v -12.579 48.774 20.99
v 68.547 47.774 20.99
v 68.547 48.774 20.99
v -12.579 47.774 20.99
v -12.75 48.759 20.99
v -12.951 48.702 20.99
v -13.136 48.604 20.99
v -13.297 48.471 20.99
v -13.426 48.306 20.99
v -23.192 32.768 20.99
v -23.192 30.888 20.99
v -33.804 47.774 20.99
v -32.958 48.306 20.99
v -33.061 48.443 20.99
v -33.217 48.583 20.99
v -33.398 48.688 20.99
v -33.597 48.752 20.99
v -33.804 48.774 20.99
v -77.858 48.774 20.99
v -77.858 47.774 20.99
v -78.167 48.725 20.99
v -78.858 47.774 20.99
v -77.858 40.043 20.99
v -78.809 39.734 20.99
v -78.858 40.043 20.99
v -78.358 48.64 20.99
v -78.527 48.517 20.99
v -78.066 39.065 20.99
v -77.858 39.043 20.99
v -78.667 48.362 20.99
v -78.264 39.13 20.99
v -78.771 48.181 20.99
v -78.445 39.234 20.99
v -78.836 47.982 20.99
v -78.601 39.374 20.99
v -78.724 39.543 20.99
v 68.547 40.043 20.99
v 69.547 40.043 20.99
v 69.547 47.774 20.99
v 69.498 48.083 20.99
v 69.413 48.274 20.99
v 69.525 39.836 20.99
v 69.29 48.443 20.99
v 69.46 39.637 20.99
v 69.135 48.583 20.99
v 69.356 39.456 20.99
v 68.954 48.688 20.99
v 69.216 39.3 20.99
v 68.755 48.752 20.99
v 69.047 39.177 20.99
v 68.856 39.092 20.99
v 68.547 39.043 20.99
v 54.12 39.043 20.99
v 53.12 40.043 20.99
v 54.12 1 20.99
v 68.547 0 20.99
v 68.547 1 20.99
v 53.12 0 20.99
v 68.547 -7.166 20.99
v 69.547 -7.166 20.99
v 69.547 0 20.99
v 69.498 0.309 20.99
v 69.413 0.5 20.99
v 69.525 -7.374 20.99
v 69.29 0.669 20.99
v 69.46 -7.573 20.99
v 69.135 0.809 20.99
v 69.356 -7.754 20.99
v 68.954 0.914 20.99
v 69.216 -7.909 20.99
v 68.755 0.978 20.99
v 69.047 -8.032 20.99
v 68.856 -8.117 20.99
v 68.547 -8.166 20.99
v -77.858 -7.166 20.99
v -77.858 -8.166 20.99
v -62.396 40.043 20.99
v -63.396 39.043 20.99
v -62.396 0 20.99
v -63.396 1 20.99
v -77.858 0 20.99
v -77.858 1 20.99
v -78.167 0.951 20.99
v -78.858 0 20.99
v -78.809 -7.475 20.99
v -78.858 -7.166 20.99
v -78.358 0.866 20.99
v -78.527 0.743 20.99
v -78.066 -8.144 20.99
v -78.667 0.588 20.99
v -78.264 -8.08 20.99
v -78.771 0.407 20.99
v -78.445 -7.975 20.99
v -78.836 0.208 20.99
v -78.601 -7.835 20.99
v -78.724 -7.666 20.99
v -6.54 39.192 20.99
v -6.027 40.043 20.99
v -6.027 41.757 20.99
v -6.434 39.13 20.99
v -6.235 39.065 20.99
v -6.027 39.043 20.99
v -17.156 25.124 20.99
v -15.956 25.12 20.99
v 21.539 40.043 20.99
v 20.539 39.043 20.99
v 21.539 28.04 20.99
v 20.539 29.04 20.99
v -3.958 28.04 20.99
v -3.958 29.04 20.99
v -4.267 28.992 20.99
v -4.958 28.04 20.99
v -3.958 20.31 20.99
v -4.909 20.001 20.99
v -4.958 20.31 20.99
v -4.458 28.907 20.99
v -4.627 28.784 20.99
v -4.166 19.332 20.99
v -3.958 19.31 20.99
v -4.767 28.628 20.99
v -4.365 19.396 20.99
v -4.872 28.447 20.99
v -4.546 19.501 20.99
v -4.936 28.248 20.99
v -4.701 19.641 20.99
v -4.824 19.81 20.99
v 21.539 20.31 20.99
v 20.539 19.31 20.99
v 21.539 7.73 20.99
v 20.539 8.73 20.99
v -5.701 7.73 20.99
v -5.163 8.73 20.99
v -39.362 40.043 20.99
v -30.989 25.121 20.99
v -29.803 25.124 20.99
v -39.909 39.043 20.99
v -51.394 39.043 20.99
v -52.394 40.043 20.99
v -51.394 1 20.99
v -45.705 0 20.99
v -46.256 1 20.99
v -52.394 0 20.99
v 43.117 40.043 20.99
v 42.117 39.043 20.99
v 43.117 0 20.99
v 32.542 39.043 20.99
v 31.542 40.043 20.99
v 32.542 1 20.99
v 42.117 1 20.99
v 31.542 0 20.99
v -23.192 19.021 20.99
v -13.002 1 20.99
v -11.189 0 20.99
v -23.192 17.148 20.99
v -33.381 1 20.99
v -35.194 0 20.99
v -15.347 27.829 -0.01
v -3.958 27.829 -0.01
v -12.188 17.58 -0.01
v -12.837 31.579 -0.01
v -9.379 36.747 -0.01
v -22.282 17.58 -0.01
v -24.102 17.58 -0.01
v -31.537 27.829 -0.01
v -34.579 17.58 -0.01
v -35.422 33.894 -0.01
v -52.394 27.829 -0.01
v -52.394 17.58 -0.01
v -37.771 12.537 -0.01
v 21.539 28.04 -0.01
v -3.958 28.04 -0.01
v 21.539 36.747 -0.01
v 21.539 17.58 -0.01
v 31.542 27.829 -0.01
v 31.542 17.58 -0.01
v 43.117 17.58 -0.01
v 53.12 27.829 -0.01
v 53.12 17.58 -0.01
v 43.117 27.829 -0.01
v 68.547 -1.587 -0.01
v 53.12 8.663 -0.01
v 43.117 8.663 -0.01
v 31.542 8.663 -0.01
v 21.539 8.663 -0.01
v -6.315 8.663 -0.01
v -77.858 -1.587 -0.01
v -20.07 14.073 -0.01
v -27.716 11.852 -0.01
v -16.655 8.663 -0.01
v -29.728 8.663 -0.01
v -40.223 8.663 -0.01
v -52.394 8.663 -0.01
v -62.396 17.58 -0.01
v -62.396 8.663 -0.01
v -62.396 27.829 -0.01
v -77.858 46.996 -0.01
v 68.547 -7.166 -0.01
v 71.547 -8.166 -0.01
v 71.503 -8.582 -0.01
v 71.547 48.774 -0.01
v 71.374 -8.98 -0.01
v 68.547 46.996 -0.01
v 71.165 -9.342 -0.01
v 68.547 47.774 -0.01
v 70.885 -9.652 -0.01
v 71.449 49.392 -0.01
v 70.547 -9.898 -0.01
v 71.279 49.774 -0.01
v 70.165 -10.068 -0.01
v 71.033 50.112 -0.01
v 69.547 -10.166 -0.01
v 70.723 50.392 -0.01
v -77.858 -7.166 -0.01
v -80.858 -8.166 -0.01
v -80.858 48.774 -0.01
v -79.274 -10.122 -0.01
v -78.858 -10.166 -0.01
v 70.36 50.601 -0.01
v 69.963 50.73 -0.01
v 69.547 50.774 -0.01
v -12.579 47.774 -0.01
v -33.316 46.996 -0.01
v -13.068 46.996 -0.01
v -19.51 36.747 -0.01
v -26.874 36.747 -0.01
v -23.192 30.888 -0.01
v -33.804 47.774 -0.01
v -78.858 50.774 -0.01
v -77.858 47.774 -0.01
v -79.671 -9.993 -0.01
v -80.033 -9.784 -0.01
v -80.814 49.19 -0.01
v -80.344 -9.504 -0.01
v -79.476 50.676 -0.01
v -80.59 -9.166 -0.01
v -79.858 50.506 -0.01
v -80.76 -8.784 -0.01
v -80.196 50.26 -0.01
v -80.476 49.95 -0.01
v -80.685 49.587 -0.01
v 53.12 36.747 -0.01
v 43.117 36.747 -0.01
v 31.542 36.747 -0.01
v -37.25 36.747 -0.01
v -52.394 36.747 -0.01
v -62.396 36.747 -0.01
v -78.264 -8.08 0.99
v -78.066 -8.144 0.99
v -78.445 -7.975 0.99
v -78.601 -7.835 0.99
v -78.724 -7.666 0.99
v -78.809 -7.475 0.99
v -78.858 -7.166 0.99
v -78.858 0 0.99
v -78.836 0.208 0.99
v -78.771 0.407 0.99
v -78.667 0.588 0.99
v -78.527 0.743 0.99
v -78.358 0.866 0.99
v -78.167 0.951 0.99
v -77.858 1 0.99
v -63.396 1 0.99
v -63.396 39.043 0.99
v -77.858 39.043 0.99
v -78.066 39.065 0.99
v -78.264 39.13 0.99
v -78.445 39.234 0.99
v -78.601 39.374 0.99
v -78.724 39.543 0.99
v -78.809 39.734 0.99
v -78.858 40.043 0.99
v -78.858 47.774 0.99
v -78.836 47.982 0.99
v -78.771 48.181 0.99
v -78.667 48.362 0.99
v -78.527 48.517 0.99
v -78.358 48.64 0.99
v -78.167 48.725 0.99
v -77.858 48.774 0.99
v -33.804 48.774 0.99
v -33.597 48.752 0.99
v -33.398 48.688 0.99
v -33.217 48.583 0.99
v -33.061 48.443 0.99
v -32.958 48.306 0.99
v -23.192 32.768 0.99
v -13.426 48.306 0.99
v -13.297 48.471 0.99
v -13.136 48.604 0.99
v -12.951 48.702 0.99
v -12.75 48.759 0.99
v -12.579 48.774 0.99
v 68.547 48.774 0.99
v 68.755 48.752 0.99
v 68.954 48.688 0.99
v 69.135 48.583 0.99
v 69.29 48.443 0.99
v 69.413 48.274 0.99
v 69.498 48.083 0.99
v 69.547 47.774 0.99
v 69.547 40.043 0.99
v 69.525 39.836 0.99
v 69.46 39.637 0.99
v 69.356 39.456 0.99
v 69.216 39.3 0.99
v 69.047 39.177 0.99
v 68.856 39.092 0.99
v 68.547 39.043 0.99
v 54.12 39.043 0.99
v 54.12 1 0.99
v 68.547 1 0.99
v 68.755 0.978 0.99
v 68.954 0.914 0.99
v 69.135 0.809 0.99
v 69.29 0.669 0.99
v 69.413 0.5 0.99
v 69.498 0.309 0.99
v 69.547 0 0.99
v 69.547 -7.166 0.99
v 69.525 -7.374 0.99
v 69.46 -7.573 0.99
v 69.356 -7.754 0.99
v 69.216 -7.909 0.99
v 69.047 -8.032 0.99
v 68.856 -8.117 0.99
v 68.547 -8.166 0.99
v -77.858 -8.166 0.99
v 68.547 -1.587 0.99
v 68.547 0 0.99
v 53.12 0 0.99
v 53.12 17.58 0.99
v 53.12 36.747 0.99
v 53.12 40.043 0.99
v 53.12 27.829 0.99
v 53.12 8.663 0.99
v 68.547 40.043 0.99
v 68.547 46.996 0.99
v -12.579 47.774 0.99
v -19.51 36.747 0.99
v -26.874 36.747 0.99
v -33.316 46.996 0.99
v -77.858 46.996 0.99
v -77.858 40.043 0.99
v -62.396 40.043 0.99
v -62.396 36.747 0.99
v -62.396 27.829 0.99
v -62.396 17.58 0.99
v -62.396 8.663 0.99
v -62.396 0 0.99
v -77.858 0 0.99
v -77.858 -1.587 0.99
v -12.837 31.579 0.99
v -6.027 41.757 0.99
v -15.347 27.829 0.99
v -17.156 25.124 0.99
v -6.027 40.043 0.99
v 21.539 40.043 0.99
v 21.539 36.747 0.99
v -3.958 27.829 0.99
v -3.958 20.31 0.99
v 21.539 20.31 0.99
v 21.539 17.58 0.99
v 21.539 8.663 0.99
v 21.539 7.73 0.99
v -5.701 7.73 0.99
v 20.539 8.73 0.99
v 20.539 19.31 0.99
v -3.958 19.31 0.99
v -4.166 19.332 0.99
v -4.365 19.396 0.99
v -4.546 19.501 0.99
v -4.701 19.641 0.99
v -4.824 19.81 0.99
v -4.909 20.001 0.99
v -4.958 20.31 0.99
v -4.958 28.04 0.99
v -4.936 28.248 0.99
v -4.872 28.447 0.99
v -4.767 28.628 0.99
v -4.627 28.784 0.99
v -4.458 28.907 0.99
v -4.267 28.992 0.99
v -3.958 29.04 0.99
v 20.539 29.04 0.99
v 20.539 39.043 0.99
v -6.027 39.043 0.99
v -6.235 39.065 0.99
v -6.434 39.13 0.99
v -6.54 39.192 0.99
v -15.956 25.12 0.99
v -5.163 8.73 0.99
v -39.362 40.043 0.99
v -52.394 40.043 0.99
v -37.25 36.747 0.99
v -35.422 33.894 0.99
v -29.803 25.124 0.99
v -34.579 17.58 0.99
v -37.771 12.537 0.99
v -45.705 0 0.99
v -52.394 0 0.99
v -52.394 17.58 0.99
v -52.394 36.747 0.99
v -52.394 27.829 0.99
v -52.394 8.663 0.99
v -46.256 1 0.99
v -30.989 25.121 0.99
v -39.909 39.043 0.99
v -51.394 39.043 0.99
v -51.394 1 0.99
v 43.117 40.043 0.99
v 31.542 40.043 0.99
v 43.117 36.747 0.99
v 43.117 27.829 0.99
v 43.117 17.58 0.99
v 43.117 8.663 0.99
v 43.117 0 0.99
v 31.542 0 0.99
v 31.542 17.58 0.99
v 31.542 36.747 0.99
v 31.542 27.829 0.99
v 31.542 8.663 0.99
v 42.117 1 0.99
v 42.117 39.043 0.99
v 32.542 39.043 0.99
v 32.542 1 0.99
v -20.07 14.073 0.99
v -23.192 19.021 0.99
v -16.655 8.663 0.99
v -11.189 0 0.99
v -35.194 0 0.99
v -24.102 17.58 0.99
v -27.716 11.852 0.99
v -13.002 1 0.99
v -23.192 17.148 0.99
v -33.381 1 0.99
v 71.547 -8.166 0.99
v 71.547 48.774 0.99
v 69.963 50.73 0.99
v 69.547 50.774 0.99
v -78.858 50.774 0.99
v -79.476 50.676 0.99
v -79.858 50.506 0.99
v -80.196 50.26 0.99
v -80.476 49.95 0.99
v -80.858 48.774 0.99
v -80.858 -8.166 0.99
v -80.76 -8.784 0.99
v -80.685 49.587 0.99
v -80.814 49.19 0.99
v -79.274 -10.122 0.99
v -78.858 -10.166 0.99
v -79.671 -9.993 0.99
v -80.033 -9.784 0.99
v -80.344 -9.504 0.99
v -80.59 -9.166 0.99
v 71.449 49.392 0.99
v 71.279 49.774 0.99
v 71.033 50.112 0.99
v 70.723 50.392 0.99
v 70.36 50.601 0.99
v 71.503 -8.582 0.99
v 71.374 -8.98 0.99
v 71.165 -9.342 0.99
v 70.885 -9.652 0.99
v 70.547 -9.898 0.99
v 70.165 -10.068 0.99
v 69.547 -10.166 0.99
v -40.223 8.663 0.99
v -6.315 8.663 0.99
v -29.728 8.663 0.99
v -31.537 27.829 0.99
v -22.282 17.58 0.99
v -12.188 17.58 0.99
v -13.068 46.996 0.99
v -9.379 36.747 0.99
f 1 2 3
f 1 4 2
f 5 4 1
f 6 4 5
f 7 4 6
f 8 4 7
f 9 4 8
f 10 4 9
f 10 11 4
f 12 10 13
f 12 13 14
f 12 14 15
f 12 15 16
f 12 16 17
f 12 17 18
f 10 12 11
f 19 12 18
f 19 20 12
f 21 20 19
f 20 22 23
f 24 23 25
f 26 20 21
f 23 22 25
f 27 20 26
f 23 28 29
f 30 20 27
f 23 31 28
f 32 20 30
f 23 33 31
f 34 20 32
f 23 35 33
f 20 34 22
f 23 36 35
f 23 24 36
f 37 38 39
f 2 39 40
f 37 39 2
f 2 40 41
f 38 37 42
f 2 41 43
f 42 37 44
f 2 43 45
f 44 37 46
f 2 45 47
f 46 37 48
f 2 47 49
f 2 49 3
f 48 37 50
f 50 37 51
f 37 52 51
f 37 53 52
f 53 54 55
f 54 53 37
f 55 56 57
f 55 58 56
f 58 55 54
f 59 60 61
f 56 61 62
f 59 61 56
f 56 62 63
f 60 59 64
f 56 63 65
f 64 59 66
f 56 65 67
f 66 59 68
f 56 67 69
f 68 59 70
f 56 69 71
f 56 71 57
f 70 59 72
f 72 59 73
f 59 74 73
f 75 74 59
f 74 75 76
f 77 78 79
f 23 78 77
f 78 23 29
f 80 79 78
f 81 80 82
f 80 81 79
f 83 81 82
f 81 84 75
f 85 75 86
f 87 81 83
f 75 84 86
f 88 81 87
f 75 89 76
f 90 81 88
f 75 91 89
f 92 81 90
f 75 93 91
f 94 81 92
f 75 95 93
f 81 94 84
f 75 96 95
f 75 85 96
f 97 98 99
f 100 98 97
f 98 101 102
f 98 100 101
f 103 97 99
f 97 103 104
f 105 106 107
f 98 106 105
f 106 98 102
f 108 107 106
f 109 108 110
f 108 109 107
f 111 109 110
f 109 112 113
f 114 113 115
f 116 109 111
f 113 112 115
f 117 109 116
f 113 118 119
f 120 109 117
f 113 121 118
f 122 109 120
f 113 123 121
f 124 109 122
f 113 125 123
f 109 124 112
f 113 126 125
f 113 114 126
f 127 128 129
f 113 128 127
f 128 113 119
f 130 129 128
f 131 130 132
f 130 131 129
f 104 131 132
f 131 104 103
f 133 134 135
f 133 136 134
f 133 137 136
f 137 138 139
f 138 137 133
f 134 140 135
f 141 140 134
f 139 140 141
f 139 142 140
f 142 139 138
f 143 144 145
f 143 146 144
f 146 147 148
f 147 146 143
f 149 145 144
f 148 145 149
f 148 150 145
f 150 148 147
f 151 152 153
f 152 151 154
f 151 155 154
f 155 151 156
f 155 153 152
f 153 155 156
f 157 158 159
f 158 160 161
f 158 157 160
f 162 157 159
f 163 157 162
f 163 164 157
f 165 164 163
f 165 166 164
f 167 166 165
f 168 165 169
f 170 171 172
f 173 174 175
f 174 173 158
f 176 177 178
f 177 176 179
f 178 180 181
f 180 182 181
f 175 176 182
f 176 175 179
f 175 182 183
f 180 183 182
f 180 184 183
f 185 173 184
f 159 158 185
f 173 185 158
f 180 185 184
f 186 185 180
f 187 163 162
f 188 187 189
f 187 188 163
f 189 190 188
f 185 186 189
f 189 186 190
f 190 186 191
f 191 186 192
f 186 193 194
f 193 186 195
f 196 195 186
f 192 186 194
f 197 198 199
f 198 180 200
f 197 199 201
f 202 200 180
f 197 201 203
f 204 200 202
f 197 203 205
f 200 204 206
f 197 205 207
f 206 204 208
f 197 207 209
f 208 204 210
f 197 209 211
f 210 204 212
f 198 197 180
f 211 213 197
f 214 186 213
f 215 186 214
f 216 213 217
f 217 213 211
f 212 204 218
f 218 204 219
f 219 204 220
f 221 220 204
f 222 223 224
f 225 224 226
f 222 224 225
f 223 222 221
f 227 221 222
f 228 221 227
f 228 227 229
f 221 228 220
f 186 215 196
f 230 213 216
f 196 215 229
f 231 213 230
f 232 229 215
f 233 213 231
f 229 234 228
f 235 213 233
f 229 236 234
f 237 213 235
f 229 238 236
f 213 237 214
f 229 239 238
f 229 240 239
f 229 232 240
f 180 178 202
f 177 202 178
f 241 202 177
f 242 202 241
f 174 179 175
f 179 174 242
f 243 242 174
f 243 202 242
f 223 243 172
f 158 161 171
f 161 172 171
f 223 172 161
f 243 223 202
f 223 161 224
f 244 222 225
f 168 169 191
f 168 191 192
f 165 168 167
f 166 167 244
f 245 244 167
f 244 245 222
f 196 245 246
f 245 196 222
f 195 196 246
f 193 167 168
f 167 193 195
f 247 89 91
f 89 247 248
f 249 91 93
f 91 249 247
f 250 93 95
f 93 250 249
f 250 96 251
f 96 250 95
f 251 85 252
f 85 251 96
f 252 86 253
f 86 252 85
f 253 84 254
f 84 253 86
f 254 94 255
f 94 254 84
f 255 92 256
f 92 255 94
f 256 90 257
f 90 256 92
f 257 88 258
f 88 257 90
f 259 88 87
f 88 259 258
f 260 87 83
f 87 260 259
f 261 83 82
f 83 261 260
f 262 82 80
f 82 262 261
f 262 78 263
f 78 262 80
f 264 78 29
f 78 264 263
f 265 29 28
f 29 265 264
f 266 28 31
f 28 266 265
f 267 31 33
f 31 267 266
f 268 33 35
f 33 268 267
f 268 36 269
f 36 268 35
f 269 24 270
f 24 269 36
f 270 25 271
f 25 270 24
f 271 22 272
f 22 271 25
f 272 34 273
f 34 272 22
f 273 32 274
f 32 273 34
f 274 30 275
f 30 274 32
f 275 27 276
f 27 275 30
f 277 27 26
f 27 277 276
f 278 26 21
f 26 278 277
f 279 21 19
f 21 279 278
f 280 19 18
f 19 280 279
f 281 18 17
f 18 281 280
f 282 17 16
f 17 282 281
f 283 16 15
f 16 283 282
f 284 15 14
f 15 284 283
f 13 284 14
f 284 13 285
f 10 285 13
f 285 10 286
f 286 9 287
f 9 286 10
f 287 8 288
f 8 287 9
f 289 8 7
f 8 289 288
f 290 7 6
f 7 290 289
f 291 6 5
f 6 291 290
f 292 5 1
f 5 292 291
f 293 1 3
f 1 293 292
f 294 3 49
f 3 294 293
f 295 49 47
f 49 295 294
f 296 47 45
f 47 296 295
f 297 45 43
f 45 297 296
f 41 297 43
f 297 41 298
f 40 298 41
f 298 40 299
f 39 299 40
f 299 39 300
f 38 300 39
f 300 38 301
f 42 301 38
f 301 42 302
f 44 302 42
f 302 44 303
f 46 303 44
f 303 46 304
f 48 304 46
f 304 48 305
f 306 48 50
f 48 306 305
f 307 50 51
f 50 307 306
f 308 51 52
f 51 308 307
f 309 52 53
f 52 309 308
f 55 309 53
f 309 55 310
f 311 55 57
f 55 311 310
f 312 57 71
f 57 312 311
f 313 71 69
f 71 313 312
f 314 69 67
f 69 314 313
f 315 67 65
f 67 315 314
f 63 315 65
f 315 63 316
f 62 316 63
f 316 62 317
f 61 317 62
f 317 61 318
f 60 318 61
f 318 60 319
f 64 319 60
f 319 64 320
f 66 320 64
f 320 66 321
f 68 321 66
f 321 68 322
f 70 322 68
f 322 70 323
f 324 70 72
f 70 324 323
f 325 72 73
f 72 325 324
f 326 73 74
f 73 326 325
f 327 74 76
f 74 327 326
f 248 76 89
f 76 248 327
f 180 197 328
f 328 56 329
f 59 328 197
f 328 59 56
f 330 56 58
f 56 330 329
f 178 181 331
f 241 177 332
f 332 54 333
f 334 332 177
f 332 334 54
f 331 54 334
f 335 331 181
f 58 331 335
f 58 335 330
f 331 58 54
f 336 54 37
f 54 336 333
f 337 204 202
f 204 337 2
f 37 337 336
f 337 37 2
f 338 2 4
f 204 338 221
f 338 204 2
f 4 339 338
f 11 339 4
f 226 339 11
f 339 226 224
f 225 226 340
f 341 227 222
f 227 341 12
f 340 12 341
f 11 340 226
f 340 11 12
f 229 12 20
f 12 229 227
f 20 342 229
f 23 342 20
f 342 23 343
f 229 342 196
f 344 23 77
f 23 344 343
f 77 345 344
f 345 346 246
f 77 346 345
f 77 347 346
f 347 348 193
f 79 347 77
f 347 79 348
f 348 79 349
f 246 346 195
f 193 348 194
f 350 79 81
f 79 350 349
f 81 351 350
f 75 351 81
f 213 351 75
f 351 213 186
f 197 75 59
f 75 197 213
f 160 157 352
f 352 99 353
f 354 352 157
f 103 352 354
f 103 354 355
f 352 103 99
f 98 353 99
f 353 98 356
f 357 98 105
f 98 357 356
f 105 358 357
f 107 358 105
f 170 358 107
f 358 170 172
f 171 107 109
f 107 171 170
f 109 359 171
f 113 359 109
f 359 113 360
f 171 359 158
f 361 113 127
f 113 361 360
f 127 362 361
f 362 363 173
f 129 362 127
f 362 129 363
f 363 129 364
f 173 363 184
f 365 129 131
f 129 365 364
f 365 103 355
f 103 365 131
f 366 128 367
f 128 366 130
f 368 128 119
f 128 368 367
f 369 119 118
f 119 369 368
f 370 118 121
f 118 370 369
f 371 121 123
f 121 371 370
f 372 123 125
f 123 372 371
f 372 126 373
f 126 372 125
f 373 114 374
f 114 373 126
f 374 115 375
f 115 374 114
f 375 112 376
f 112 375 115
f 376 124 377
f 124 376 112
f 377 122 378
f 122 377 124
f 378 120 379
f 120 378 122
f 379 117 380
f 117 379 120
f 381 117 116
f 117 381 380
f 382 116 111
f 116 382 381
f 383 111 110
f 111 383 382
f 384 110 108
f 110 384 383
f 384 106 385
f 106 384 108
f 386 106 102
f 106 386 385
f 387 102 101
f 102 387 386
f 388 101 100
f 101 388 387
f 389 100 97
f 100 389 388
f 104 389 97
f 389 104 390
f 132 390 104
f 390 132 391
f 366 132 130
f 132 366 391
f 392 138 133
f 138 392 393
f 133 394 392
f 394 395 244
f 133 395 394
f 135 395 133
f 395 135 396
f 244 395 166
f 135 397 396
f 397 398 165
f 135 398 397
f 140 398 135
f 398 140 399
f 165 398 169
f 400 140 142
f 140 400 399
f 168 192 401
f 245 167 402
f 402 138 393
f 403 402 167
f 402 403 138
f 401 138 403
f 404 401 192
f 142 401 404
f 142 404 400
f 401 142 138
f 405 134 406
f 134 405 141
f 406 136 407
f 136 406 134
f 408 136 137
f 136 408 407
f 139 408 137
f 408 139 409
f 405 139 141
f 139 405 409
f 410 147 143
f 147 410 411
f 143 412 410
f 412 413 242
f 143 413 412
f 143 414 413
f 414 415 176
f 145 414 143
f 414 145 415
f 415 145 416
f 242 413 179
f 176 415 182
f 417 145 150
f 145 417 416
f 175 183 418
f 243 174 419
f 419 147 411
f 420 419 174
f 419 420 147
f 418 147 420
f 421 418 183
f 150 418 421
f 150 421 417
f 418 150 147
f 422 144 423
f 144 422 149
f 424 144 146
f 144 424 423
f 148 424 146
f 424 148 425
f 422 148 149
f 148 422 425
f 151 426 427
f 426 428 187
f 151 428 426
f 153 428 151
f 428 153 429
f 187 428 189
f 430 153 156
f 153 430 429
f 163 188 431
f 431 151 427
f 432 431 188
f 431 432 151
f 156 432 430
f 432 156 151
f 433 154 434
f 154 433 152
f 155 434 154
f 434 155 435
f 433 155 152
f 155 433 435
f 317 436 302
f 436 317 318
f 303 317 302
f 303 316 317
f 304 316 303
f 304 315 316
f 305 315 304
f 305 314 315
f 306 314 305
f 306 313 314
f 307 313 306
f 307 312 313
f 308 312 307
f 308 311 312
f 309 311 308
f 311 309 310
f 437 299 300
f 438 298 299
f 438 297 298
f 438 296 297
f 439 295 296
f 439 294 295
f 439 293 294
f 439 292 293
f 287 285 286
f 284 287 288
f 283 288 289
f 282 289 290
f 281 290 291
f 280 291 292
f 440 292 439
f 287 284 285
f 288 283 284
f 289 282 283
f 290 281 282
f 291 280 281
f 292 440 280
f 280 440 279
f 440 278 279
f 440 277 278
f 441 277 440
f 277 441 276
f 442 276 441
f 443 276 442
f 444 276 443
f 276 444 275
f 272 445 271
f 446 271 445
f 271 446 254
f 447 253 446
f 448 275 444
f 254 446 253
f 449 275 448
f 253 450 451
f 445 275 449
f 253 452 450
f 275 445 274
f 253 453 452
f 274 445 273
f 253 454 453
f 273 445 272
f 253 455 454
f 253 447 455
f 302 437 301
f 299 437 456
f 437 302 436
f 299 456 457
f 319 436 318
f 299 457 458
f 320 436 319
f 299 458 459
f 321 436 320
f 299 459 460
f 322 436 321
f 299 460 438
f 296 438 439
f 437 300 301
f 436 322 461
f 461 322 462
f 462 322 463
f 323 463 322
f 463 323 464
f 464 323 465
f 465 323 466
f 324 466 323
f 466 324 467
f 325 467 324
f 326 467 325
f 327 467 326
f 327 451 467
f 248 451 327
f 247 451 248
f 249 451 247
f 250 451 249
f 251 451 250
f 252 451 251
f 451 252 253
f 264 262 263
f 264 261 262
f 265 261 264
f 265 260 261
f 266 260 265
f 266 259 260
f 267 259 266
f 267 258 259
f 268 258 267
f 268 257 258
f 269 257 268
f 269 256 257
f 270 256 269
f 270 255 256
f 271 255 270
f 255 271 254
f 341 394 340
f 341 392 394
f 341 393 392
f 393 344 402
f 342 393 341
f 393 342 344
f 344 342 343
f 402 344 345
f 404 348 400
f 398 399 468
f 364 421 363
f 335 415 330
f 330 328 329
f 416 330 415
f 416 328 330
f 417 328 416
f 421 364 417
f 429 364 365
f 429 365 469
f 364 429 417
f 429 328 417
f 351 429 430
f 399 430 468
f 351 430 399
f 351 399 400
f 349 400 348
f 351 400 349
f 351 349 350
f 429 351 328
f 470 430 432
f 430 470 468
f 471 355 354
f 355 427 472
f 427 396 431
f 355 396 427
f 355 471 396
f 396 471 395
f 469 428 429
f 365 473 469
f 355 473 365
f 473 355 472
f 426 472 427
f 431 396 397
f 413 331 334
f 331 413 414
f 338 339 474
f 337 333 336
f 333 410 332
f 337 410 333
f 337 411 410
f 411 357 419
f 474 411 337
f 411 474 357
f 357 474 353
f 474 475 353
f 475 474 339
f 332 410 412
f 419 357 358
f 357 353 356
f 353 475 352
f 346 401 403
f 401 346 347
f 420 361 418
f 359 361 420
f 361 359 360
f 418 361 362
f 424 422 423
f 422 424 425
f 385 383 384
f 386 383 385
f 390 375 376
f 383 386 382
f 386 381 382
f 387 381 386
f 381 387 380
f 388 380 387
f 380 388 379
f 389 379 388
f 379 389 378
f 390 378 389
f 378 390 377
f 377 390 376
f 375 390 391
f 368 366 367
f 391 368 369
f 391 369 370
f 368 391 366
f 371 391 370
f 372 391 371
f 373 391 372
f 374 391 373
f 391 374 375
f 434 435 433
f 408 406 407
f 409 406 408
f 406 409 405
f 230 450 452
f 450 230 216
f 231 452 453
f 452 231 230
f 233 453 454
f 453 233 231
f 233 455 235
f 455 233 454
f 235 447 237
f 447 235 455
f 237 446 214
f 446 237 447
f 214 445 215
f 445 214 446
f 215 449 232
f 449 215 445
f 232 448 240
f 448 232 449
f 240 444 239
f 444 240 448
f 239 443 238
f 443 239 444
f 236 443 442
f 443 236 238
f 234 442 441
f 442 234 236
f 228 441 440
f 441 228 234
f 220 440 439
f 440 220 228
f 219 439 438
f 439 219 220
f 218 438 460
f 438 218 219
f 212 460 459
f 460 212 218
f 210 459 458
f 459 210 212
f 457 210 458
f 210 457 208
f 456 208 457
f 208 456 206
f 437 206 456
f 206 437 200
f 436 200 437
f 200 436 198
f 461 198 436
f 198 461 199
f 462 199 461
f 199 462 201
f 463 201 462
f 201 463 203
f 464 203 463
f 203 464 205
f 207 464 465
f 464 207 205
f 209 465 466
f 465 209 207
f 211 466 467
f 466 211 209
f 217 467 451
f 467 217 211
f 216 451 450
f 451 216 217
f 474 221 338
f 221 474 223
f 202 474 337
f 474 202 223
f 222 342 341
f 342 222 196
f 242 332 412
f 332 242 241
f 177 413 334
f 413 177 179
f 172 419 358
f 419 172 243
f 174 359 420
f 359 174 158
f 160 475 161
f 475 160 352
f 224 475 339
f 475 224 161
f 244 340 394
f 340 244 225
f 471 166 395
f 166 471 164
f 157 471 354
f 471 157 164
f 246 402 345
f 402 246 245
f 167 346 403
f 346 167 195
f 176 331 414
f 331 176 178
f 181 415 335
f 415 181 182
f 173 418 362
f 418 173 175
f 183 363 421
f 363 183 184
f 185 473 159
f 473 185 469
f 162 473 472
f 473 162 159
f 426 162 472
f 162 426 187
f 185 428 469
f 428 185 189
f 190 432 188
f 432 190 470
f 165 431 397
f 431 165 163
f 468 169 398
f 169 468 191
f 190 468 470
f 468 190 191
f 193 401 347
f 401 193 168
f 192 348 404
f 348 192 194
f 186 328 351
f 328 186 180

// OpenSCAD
// (recommended ALL UPPERCASE/CAPITAL LETTERS)
text = "TEXT";

text_size = 50; // [5:1:300]

// (less than 100% helps letters stay connected)
letter_spacing_percentage = 80; // [10:1:200]

// (also helps to keep letters joined)
include_underline = 1; // [0:No, 1:Yes]

underline_height_percentage = 15; // [1:1:50]

// (millimeters)
wall_height = 20; // [1:0.1:40]

// (millimeters)
wall_thickness = 1; // [0:0.1:10]

// (millimeters)
top_support_overhang = 2; // [0:0.1:10]

// (millimeters)
top_support_thickness = 1; // [0:0.1:10]

number_of_support_lines = 3; // [0:1:10]

support_line_height_percentage = 18; // [0:1:50]

support_line_offset_percentage = 12; // [-100:1:100]

// Render a preview of the cookie (turn this OFF before saving/printing)
cookie_preview = 0; // [0:Off, 1:On]


// str2vec from Nathanaël Jourdane (nathanael@jourdane.net)
// http://www.thingiverse.com/thing:1237203
function str2vec(str, v=[], i=0) =
	i == len(str) ? v :
	str2vec(str, concat(v, str[i]), i+1);

module Text2D(text, size, underline=0, underline_height=0.16, spacing=0.8, radius=0) {
    offset(r=radius) {
        text(str(text),
            size=size,
            font="Helvetica:style=Bold",
            halign="center",
            spacing=spacing);
        if (underline == 1) {
            descenders = len([ for (a = search(str2vec("qpjg"), str2vec(str(text)))) if (a > 0) a ]) > 0;
            descender_correction = descenders ? 0.3 * size * underline_height : 0;
            translate([0, -1 * descender_correction, 0]) projection(cut = false) scale([1, -1 * underline_height, 1]) hull() BoundingBox() linear_extrude(height=1, convexity=4) {
                text(str(text),
                    size=size,
                    font="Helvetica:style=Bold",
                    halign="center",
                    spacing=spacing);
            }
        }
    }
}

module OutlineText(text, size, underline=0, underline_height=0.16, spacing=0.8, height=3, thickness=1) {
    linear_extrude(height=height, convexity=4) {
        difference() {
            Text2D(text, size, underline, underline_height, spacing, thickness);
            translate([0, 0, 0.1]) scale([1, 1, 1.5]) Text2D(text, size, underline, underline_height, spacing, 0);
        }
    }
}

module OutlineTextSupports(text, size, underline=0, spacing=0.8, thickness=1, height=3, overhang=10, number_of_support_lines=3, support_line_height=0.15, support_line_offset=0, underline_height=0.16) {
    linear_extrude(height=height, convexity=4) union() {
        difference() {
            offset(overhang) projection(cut = false) hull() BoundingBox() linear_extrude(height=1, convexity=4) Text2D(text, size, underline, underline_height, spacing, thickness);
            Text2D(text, size, underline, underline_height, spacing, 0);
        }
        
        descenders = len([ for (a = search(str2vec("qpjg"), str2vec(str(text)))) if (a > 0) a ]) > 0;
        descender_correction = descenders ? 0.3 * size * underline_height : 0;
        underline_size = (underline == 1) ? size * underline_height + descender_correction : 0;
        v_size = size + underline_size;
        v_space = v_size / number_of_support_lines;
        
        for (s = [0 : 1 : number_of_support_lines - 1]) {
            translate([0, s * v_space - underline_size + (v_space / 2) - (support_line_height * size / 2) + (support_line_offset * v_space), 0]) projection(cut = false) scale([1, support_line_height, 1]) hull() BoundingBox() linear_extrude(height=1, convexity=4) Text2D(text, size, underline, underline_height, spacing, thickness);
        }
    }
}

module BoundingBox() {
    intersection() {
        translate([0,0,0])
        linear_extrude(height = 1000, center = true, convexity = 10, twist = 0) 
        projection(cut=false) intersection() {
            rotate([0,90,0]) 
            linear_extrude(height = 1000, center = true, convexity = 10, twist = 0) 
            projection(cut=false) 
            rotate([0,-90,0]) 
            children(0);
            rotate([90,0,0]) 
            linear_extrude(height = 1000, center = true, convexity = 10, twist = 0) 
            projection(cut=false) 
            rotate([-90,0,0]) 
            children(0);
        }
        rotate([90,0,0]) 
        linear_extrude(height = 1000, center = true, convexity = 10, twist = 0) 
        projection(cut=false) 
        rotate([-90,0,0])
        intersection() {
            rotate([0,90,0]) 
            linear_extrude(height = 1000, center = true, convexity = 10, twist = 0) 
            projection(cut=false) 
            rotate([0,-90,0]) 
            children(0);
            rotate([0,0,0]) 
            linear_extrude(height = 1000, center = true, convexity = 10, twist = 0) 
            projection(cut=false) 
            rotate([0,0,0]) 
            children(0);
        }
    }
}


// Lower the minimum fragment size for smoother edges
$fs = 0.1;

if (cookie_preview == 1) {
    linear_extrude(height=4, convexity=4) {
        Text2D(text, text_size, include_underline, underline_height_percentage / 100.0, letter_spacing_percentage / 100.0, 0);
    }
} else {
    translate([0, 0, wall_height + top_support_thickness - 0.01]) scale([-1, 1, -1]) union() {
        OutlineText(text, text_size, include_underline, underline_height_percentage / 100.0, letter_spacing_percentage / 100.0, wall_height + top_support_thickness, wall_thickness);
        translate([0, 0, wall_height]) OutlineTextSupports(text, text_size, include_underline, letter_spacing_percentage / 100.0, wall_thickness, top_support_thickness, top_support_overhang, number_of_support_lines, support_line_height_percentage / 100.0, support_line_offset_percentage / 100.0, underline_height_percentage / 100.0);
    }
}
